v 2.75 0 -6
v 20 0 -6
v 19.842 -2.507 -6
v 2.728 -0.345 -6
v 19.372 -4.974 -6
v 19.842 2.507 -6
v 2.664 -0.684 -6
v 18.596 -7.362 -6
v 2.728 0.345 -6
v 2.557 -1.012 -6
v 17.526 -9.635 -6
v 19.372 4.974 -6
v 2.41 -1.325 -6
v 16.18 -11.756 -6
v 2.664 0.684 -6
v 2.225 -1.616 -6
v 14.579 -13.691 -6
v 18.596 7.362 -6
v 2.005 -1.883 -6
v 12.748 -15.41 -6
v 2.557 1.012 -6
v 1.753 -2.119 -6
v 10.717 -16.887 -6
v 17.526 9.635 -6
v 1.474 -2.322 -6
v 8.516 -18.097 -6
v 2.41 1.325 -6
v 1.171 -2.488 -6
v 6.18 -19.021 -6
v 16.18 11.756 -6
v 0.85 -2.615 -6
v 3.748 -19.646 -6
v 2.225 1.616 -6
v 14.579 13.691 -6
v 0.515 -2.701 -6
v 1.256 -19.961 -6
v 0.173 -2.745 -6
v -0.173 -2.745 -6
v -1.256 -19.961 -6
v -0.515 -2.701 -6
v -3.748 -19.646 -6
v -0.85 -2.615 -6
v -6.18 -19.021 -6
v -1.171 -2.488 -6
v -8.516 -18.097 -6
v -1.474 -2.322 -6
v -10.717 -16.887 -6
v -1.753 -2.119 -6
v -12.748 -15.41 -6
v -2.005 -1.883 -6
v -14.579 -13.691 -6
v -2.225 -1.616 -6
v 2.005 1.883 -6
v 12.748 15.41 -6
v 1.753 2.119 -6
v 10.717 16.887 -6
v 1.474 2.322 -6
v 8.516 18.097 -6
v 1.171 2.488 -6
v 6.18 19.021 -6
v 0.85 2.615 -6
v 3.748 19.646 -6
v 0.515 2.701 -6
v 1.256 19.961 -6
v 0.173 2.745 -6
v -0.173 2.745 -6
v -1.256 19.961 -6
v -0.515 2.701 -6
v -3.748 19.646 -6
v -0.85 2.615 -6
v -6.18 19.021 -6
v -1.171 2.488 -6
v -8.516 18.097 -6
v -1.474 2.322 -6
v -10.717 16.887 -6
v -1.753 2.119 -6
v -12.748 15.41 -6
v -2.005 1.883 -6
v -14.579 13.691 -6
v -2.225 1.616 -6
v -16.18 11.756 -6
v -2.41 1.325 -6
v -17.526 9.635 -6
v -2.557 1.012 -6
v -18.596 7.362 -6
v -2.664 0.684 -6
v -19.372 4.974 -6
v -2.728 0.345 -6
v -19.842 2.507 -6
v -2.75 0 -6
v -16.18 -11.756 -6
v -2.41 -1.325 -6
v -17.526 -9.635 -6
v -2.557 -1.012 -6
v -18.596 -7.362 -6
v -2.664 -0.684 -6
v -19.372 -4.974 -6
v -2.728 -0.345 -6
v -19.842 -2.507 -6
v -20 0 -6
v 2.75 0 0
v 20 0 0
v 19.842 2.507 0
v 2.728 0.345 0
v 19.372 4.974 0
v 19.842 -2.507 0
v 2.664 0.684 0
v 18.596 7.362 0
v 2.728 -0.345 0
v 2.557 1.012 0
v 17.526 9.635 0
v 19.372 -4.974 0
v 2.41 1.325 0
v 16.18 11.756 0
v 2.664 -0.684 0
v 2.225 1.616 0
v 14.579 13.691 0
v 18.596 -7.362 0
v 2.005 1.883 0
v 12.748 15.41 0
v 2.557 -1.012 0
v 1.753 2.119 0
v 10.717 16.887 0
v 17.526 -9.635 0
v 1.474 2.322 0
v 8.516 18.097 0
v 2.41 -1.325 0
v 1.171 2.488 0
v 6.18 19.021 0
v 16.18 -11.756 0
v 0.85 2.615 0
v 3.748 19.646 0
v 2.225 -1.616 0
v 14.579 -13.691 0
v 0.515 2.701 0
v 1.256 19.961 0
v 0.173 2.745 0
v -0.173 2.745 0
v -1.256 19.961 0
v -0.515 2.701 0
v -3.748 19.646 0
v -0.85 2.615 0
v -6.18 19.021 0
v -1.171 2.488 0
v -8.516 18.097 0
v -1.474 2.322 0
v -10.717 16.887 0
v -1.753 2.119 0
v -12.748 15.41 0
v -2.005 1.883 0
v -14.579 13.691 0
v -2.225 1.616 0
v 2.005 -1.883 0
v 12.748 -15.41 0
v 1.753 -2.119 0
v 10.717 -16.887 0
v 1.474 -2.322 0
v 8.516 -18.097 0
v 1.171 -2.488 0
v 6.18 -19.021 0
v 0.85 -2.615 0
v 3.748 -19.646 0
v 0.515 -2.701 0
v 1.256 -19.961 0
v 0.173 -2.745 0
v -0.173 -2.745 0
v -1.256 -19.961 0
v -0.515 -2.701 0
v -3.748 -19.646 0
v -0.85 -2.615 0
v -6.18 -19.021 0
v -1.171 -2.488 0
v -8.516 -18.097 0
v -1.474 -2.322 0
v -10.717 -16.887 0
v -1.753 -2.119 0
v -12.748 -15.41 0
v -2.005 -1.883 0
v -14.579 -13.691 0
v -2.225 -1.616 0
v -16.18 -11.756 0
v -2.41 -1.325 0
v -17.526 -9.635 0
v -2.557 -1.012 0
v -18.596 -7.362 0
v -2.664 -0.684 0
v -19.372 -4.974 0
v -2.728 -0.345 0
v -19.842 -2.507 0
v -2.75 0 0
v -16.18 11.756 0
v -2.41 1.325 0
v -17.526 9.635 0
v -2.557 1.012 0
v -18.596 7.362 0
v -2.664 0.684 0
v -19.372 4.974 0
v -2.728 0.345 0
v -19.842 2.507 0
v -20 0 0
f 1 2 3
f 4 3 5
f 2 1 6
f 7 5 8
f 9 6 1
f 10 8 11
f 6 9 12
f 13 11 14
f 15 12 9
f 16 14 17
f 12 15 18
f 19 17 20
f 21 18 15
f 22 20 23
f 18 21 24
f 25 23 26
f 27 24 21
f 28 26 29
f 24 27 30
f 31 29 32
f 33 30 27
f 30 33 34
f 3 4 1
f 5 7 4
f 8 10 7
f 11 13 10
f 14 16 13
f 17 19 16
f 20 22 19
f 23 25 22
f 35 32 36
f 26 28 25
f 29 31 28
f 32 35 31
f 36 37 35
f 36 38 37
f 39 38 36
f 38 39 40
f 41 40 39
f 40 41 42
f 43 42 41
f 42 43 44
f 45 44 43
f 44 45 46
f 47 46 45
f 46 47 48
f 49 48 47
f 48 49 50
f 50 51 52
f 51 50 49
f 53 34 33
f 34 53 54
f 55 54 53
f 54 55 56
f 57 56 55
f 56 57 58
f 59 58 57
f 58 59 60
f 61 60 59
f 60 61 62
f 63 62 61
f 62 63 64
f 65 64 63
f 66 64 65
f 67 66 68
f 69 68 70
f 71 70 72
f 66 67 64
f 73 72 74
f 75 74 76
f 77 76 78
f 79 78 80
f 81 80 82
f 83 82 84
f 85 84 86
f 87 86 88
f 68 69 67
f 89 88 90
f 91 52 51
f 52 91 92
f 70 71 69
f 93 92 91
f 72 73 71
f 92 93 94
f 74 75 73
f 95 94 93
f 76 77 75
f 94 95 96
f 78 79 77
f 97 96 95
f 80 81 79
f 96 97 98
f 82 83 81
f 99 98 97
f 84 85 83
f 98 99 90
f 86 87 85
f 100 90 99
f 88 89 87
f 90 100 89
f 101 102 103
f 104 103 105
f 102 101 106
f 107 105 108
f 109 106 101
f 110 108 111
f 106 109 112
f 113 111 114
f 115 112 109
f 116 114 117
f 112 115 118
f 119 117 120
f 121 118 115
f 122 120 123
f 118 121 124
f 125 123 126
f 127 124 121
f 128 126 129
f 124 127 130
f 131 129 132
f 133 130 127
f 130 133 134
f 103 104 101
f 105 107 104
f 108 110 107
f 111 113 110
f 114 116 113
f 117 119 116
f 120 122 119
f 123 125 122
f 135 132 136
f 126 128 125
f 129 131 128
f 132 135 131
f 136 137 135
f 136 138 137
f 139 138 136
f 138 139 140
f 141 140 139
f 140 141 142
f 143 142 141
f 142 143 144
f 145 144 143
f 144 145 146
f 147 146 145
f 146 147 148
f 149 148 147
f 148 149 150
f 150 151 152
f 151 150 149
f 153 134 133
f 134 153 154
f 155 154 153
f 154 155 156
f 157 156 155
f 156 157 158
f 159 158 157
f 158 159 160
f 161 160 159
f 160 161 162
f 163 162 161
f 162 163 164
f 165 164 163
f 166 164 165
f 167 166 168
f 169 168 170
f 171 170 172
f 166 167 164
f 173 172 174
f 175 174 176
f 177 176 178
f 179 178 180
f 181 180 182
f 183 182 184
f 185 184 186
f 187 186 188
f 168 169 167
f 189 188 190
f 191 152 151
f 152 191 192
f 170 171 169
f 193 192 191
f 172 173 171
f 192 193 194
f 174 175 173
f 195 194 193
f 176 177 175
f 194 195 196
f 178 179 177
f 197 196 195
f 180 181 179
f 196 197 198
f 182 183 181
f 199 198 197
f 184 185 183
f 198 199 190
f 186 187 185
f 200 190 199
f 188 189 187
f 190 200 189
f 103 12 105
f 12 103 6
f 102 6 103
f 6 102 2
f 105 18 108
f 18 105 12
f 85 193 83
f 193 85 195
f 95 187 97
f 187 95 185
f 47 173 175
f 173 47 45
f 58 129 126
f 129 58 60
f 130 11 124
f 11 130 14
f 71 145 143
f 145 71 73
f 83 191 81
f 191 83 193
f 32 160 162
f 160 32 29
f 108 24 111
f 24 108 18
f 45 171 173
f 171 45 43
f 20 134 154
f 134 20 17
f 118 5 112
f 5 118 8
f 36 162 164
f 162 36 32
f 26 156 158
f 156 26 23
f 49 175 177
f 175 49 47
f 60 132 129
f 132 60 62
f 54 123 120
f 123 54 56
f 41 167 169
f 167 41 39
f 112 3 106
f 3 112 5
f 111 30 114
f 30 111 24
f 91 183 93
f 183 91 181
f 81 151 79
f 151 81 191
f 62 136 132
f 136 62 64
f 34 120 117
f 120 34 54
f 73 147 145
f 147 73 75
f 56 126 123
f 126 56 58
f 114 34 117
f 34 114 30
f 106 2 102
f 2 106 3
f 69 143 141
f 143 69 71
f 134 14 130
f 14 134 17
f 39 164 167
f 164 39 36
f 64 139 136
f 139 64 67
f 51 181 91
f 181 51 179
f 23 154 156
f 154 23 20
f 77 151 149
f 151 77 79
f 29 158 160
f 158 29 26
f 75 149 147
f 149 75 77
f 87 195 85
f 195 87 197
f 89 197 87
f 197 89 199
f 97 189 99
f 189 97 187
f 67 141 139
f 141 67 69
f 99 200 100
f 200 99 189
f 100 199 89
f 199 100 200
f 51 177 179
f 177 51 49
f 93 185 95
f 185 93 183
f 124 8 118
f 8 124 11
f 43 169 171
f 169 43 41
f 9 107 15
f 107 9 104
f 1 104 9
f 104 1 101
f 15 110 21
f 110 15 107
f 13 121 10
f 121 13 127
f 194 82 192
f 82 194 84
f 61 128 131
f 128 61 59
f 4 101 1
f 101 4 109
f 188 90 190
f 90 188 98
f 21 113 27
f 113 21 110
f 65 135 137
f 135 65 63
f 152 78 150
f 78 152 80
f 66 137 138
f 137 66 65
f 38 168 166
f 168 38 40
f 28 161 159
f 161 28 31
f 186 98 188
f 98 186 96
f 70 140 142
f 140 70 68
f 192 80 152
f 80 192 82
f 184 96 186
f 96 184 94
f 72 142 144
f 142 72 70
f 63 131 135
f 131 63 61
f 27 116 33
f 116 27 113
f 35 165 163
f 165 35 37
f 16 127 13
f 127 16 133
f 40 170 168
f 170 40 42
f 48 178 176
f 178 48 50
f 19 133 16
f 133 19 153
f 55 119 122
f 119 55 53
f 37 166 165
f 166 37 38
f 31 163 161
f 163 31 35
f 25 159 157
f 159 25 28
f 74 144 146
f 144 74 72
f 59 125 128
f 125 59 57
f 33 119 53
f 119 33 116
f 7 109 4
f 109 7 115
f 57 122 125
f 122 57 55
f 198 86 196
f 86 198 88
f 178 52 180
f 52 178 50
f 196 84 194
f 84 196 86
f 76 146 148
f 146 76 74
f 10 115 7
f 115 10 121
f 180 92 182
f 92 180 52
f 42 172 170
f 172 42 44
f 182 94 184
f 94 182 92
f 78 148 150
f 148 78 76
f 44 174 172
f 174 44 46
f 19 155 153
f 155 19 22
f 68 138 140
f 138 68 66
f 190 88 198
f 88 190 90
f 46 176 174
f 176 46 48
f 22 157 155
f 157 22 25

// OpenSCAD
$fn = 50;


difference() {
	union() {
		translate(v = [0, 0, -6.0000000000]) {
			cylinder(h = 6, r = 10.0000000000);
		}
		translate(v = [0, 0, -6.0000000000]) {
			cylinder(h = 6, r = 20.0000000000);
		}
	}
	union() {
		#translate(v = [0, 0, -6]) {
			cylinder(h = 6, r = 2.7500000000);
		}
	}
}
